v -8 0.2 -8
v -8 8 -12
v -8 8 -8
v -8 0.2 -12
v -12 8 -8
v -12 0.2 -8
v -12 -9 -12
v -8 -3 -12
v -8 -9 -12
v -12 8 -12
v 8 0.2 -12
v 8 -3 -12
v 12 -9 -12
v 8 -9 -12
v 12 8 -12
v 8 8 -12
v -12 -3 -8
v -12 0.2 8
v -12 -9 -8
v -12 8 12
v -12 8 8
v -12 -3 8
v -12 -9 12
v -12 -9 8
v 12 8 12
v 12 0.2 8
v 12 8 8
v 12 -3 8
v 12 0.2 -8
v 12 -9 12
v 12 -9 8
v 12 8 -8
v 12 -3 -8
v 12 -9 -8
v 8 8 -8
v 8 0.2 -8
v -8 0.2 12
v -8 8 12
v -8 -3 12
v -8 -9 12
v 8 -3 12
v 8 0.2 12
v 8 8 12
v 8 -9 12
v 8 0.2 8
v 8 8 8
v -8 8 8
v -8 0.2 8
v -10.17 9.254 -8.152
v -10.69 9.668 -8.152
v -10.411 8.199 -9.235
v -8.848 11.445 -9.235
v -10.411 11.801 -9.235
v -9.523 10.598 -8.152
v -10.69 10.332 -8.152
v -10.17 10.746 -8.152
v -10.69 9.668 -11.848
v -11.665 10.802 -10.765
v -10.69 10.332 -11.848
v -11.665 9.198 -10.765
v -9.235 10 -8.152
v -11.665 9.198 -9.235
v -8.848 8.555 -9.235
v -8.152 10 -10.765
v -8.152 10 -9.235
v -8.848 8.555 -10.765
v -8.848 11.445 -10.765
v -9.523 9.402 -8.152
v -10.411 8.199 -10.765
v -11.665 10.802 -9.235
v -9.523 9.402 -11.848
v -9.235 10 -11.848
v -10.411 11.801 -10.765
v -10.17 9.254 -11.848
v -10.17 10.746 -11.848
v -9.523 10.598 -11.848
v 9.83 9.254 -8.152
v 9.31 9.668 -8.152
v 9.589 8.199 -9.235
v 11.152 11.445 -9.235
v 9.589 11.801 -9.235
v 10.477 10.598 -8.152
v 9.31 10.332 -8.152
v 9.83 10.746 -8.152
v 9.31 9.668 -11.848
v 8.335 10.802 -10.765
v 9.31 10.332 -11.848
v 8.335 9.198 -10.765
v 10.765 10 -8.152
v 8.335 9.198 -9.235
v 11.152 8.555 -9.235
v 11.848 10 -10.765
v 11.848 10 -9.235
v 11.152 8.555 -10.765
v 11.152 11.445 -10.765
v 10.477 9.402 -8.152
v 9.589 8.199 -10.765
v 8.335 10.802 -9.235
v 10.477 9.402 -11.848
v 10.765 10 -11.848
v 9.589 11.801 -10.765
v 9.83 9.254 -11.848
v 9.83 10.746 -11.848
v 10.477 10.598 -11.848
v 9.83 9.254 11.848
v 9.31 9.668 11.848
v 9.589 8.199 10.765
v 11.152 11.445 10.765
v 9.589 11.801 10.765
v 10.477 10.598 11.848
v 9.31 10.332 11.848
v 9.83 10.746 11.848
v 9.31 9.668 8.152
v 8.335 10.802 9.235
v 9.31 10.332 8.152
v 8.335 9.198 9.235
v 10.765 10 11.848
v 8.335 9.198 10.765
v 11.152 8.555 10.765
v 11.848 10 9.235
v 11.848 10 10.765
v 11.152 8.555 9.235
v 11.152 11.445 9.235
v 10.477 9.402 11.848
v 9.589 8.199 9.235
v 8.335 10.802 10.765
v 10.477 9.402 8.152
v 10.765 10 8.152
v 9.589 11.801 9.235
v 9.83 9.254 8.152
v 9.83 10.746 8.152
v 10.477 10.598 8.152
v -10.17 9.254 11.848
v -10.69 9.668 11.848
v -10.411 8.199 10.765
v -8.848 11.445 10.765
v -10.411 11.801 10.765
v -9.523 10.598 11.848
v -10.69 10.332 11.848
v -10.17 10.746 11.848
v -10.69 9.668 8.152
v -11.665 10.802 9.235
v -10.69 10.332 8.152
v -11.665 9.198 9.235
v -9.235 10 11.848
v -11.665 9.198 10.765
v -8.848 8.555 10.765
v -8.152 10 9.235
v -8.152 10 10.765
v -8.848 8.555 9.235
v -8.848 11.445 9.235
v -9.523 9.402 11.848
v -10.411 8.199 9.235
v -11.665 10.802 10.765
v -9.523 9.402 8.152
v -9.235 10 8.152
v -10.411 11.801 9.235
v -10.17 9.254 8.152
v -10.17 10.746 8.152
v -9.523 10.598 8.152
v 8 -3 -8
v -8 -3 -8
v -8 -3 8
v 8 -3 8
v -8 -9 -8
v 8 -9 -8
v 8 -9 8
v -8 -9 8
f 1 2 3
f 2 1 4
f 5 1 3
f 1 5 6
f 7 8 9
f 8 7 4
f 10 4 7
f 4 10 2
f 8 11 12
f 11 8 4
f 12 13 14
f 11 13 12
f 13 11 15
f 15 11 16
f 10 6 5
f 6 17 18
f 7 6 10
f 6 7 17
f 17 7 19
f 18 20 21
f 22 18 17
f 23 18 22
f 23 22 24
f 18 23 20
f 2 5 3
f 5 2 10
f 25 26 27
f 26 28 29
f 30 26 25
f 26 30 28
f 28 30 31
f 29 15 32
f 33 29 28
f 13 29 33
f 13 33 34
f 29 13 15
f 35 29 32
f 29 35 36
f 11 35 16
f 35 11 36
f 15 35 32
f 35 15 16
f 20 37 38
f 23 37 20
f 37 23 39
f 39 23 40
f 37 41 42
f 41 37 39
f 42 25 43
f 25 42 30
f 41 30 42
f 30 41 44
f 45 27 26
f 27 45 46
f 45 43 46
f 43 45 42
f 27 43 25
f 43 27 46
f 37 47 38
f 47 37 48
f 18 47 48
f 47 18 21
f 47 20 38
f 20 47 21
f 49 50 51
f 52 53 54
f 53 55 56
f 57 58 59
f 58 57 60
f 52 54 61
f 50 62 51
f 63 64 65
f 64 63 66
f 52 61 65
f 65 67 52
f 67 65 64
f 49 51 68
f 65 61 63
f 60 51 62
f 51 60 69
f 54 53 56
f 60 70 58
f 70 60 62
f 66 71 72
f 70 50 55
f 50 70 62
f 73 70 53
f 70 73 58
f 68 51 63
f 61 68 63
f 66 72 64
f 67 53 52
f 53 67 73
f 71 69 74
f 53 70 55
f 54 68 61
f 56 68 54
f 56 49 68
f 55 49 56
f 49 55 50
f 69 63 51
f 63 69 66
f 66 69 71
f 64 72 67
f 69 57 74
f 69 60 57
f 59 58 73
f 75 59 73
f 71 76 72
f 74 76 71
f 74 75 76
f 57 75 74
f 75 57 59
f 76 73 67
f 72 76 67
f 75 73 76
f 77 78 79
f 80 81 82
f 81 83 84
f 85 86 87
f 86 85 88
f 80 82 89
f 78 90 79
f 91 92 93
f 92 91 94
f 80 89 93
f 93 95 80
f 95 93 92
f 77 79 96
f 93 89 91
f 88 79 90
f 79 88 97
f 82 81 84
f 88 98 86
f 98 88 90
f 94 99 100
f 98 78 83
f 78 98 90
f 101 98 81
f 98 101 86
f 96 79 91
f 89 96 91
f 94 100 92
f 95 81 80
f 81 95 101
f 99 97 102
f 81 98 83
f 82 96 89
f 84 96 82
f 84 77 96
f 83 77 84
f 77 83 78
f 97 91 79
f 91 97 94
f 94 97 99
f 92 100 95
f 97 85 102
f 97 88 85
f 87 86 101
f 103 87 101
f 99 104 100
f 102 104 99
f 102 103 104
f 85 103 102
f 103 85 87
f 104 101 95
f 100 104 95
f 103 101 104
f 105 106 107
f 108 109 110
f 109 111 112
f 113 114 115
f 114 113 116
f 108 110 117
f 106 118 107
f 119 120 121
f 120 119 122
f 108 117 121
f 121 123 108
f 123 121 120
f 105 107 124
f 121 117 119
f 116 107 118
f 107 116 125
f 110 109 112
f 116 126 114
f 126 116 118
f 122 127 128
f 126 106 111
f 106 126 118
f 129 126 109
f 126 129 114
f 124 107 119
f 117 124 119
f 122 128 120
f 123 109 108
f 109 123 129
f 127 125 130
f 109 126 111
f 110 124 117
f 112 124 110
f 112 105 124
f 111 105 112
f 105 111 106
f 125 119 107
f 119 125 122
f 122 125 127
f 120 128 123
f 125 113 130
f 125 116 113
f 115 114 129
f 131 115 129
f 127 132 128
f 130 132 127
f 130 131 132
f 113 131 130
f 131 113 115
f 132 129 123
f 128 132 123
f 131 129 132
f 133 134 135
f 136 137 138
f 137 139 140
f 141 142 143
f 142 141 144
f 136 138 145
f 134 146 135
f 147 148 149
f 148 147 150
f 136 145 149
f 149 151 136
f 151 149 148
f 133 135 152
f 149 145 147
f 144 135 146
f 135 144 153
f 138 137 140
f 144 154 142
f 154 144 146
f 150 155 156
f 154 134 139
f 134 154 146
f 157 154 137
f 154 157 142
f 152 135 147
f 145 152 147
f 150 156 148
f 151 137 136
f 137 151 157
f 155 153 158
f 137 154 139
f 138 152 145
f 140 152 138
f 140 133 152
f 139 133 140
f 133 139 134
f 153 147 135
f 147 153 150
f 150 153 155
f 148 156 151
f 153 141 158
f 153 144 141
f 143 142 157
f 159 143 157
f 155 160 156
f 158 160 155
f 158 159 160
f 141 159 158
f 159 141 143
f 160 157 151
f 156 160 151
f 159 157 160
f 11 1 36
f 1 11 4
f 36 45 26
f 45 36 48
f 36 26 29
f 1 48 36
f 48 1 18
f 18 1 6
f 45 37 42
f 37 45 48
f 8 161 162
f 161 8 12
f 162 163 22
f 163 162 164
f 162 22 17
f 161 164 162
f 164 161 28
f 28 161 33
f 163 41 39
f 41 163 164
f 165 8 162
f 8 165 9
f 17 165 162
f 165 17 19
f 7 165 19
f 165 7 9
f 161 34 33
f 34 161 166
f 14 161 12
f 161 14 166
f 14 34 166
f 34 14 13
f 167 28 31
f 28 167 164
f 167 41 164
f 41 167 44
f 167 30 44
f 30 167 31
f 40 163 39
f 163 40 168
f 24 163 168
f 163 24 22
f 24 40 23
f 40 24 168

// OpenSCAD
translate([-12,0,-12])//we can use negative values only in translate function not in other like cube or sphere.

cube([4,8,4]);
translate([8,0,-12])
cube([4,8,4]);
translate([8,0,8])
cube([4,8,4]);
translate([-12,0,8])
cube([4,8,4]);
//Now we are adding spheres 
translate([-10,10,-10])
sphere(2);
translate([10,10,-10])
sphere(2);
translate([10,10,10])
sphere(2);
translate([-10,10,10])
sphere(2);
//Now we are adding middle base for table pillers
translate([-12,-3,-12])
scale([3,0.4,3])
cube(8,0,12);
//now final pillars or base pillars
translate([-12,-9,-12])
 cube([4,6,4]);
translate([8,-9,-12])
cube([4,6,4]);
translate([8,-9,8])
cube([4,6,4]);
translate([-12,-9,8])
cube([4,6,4]);
